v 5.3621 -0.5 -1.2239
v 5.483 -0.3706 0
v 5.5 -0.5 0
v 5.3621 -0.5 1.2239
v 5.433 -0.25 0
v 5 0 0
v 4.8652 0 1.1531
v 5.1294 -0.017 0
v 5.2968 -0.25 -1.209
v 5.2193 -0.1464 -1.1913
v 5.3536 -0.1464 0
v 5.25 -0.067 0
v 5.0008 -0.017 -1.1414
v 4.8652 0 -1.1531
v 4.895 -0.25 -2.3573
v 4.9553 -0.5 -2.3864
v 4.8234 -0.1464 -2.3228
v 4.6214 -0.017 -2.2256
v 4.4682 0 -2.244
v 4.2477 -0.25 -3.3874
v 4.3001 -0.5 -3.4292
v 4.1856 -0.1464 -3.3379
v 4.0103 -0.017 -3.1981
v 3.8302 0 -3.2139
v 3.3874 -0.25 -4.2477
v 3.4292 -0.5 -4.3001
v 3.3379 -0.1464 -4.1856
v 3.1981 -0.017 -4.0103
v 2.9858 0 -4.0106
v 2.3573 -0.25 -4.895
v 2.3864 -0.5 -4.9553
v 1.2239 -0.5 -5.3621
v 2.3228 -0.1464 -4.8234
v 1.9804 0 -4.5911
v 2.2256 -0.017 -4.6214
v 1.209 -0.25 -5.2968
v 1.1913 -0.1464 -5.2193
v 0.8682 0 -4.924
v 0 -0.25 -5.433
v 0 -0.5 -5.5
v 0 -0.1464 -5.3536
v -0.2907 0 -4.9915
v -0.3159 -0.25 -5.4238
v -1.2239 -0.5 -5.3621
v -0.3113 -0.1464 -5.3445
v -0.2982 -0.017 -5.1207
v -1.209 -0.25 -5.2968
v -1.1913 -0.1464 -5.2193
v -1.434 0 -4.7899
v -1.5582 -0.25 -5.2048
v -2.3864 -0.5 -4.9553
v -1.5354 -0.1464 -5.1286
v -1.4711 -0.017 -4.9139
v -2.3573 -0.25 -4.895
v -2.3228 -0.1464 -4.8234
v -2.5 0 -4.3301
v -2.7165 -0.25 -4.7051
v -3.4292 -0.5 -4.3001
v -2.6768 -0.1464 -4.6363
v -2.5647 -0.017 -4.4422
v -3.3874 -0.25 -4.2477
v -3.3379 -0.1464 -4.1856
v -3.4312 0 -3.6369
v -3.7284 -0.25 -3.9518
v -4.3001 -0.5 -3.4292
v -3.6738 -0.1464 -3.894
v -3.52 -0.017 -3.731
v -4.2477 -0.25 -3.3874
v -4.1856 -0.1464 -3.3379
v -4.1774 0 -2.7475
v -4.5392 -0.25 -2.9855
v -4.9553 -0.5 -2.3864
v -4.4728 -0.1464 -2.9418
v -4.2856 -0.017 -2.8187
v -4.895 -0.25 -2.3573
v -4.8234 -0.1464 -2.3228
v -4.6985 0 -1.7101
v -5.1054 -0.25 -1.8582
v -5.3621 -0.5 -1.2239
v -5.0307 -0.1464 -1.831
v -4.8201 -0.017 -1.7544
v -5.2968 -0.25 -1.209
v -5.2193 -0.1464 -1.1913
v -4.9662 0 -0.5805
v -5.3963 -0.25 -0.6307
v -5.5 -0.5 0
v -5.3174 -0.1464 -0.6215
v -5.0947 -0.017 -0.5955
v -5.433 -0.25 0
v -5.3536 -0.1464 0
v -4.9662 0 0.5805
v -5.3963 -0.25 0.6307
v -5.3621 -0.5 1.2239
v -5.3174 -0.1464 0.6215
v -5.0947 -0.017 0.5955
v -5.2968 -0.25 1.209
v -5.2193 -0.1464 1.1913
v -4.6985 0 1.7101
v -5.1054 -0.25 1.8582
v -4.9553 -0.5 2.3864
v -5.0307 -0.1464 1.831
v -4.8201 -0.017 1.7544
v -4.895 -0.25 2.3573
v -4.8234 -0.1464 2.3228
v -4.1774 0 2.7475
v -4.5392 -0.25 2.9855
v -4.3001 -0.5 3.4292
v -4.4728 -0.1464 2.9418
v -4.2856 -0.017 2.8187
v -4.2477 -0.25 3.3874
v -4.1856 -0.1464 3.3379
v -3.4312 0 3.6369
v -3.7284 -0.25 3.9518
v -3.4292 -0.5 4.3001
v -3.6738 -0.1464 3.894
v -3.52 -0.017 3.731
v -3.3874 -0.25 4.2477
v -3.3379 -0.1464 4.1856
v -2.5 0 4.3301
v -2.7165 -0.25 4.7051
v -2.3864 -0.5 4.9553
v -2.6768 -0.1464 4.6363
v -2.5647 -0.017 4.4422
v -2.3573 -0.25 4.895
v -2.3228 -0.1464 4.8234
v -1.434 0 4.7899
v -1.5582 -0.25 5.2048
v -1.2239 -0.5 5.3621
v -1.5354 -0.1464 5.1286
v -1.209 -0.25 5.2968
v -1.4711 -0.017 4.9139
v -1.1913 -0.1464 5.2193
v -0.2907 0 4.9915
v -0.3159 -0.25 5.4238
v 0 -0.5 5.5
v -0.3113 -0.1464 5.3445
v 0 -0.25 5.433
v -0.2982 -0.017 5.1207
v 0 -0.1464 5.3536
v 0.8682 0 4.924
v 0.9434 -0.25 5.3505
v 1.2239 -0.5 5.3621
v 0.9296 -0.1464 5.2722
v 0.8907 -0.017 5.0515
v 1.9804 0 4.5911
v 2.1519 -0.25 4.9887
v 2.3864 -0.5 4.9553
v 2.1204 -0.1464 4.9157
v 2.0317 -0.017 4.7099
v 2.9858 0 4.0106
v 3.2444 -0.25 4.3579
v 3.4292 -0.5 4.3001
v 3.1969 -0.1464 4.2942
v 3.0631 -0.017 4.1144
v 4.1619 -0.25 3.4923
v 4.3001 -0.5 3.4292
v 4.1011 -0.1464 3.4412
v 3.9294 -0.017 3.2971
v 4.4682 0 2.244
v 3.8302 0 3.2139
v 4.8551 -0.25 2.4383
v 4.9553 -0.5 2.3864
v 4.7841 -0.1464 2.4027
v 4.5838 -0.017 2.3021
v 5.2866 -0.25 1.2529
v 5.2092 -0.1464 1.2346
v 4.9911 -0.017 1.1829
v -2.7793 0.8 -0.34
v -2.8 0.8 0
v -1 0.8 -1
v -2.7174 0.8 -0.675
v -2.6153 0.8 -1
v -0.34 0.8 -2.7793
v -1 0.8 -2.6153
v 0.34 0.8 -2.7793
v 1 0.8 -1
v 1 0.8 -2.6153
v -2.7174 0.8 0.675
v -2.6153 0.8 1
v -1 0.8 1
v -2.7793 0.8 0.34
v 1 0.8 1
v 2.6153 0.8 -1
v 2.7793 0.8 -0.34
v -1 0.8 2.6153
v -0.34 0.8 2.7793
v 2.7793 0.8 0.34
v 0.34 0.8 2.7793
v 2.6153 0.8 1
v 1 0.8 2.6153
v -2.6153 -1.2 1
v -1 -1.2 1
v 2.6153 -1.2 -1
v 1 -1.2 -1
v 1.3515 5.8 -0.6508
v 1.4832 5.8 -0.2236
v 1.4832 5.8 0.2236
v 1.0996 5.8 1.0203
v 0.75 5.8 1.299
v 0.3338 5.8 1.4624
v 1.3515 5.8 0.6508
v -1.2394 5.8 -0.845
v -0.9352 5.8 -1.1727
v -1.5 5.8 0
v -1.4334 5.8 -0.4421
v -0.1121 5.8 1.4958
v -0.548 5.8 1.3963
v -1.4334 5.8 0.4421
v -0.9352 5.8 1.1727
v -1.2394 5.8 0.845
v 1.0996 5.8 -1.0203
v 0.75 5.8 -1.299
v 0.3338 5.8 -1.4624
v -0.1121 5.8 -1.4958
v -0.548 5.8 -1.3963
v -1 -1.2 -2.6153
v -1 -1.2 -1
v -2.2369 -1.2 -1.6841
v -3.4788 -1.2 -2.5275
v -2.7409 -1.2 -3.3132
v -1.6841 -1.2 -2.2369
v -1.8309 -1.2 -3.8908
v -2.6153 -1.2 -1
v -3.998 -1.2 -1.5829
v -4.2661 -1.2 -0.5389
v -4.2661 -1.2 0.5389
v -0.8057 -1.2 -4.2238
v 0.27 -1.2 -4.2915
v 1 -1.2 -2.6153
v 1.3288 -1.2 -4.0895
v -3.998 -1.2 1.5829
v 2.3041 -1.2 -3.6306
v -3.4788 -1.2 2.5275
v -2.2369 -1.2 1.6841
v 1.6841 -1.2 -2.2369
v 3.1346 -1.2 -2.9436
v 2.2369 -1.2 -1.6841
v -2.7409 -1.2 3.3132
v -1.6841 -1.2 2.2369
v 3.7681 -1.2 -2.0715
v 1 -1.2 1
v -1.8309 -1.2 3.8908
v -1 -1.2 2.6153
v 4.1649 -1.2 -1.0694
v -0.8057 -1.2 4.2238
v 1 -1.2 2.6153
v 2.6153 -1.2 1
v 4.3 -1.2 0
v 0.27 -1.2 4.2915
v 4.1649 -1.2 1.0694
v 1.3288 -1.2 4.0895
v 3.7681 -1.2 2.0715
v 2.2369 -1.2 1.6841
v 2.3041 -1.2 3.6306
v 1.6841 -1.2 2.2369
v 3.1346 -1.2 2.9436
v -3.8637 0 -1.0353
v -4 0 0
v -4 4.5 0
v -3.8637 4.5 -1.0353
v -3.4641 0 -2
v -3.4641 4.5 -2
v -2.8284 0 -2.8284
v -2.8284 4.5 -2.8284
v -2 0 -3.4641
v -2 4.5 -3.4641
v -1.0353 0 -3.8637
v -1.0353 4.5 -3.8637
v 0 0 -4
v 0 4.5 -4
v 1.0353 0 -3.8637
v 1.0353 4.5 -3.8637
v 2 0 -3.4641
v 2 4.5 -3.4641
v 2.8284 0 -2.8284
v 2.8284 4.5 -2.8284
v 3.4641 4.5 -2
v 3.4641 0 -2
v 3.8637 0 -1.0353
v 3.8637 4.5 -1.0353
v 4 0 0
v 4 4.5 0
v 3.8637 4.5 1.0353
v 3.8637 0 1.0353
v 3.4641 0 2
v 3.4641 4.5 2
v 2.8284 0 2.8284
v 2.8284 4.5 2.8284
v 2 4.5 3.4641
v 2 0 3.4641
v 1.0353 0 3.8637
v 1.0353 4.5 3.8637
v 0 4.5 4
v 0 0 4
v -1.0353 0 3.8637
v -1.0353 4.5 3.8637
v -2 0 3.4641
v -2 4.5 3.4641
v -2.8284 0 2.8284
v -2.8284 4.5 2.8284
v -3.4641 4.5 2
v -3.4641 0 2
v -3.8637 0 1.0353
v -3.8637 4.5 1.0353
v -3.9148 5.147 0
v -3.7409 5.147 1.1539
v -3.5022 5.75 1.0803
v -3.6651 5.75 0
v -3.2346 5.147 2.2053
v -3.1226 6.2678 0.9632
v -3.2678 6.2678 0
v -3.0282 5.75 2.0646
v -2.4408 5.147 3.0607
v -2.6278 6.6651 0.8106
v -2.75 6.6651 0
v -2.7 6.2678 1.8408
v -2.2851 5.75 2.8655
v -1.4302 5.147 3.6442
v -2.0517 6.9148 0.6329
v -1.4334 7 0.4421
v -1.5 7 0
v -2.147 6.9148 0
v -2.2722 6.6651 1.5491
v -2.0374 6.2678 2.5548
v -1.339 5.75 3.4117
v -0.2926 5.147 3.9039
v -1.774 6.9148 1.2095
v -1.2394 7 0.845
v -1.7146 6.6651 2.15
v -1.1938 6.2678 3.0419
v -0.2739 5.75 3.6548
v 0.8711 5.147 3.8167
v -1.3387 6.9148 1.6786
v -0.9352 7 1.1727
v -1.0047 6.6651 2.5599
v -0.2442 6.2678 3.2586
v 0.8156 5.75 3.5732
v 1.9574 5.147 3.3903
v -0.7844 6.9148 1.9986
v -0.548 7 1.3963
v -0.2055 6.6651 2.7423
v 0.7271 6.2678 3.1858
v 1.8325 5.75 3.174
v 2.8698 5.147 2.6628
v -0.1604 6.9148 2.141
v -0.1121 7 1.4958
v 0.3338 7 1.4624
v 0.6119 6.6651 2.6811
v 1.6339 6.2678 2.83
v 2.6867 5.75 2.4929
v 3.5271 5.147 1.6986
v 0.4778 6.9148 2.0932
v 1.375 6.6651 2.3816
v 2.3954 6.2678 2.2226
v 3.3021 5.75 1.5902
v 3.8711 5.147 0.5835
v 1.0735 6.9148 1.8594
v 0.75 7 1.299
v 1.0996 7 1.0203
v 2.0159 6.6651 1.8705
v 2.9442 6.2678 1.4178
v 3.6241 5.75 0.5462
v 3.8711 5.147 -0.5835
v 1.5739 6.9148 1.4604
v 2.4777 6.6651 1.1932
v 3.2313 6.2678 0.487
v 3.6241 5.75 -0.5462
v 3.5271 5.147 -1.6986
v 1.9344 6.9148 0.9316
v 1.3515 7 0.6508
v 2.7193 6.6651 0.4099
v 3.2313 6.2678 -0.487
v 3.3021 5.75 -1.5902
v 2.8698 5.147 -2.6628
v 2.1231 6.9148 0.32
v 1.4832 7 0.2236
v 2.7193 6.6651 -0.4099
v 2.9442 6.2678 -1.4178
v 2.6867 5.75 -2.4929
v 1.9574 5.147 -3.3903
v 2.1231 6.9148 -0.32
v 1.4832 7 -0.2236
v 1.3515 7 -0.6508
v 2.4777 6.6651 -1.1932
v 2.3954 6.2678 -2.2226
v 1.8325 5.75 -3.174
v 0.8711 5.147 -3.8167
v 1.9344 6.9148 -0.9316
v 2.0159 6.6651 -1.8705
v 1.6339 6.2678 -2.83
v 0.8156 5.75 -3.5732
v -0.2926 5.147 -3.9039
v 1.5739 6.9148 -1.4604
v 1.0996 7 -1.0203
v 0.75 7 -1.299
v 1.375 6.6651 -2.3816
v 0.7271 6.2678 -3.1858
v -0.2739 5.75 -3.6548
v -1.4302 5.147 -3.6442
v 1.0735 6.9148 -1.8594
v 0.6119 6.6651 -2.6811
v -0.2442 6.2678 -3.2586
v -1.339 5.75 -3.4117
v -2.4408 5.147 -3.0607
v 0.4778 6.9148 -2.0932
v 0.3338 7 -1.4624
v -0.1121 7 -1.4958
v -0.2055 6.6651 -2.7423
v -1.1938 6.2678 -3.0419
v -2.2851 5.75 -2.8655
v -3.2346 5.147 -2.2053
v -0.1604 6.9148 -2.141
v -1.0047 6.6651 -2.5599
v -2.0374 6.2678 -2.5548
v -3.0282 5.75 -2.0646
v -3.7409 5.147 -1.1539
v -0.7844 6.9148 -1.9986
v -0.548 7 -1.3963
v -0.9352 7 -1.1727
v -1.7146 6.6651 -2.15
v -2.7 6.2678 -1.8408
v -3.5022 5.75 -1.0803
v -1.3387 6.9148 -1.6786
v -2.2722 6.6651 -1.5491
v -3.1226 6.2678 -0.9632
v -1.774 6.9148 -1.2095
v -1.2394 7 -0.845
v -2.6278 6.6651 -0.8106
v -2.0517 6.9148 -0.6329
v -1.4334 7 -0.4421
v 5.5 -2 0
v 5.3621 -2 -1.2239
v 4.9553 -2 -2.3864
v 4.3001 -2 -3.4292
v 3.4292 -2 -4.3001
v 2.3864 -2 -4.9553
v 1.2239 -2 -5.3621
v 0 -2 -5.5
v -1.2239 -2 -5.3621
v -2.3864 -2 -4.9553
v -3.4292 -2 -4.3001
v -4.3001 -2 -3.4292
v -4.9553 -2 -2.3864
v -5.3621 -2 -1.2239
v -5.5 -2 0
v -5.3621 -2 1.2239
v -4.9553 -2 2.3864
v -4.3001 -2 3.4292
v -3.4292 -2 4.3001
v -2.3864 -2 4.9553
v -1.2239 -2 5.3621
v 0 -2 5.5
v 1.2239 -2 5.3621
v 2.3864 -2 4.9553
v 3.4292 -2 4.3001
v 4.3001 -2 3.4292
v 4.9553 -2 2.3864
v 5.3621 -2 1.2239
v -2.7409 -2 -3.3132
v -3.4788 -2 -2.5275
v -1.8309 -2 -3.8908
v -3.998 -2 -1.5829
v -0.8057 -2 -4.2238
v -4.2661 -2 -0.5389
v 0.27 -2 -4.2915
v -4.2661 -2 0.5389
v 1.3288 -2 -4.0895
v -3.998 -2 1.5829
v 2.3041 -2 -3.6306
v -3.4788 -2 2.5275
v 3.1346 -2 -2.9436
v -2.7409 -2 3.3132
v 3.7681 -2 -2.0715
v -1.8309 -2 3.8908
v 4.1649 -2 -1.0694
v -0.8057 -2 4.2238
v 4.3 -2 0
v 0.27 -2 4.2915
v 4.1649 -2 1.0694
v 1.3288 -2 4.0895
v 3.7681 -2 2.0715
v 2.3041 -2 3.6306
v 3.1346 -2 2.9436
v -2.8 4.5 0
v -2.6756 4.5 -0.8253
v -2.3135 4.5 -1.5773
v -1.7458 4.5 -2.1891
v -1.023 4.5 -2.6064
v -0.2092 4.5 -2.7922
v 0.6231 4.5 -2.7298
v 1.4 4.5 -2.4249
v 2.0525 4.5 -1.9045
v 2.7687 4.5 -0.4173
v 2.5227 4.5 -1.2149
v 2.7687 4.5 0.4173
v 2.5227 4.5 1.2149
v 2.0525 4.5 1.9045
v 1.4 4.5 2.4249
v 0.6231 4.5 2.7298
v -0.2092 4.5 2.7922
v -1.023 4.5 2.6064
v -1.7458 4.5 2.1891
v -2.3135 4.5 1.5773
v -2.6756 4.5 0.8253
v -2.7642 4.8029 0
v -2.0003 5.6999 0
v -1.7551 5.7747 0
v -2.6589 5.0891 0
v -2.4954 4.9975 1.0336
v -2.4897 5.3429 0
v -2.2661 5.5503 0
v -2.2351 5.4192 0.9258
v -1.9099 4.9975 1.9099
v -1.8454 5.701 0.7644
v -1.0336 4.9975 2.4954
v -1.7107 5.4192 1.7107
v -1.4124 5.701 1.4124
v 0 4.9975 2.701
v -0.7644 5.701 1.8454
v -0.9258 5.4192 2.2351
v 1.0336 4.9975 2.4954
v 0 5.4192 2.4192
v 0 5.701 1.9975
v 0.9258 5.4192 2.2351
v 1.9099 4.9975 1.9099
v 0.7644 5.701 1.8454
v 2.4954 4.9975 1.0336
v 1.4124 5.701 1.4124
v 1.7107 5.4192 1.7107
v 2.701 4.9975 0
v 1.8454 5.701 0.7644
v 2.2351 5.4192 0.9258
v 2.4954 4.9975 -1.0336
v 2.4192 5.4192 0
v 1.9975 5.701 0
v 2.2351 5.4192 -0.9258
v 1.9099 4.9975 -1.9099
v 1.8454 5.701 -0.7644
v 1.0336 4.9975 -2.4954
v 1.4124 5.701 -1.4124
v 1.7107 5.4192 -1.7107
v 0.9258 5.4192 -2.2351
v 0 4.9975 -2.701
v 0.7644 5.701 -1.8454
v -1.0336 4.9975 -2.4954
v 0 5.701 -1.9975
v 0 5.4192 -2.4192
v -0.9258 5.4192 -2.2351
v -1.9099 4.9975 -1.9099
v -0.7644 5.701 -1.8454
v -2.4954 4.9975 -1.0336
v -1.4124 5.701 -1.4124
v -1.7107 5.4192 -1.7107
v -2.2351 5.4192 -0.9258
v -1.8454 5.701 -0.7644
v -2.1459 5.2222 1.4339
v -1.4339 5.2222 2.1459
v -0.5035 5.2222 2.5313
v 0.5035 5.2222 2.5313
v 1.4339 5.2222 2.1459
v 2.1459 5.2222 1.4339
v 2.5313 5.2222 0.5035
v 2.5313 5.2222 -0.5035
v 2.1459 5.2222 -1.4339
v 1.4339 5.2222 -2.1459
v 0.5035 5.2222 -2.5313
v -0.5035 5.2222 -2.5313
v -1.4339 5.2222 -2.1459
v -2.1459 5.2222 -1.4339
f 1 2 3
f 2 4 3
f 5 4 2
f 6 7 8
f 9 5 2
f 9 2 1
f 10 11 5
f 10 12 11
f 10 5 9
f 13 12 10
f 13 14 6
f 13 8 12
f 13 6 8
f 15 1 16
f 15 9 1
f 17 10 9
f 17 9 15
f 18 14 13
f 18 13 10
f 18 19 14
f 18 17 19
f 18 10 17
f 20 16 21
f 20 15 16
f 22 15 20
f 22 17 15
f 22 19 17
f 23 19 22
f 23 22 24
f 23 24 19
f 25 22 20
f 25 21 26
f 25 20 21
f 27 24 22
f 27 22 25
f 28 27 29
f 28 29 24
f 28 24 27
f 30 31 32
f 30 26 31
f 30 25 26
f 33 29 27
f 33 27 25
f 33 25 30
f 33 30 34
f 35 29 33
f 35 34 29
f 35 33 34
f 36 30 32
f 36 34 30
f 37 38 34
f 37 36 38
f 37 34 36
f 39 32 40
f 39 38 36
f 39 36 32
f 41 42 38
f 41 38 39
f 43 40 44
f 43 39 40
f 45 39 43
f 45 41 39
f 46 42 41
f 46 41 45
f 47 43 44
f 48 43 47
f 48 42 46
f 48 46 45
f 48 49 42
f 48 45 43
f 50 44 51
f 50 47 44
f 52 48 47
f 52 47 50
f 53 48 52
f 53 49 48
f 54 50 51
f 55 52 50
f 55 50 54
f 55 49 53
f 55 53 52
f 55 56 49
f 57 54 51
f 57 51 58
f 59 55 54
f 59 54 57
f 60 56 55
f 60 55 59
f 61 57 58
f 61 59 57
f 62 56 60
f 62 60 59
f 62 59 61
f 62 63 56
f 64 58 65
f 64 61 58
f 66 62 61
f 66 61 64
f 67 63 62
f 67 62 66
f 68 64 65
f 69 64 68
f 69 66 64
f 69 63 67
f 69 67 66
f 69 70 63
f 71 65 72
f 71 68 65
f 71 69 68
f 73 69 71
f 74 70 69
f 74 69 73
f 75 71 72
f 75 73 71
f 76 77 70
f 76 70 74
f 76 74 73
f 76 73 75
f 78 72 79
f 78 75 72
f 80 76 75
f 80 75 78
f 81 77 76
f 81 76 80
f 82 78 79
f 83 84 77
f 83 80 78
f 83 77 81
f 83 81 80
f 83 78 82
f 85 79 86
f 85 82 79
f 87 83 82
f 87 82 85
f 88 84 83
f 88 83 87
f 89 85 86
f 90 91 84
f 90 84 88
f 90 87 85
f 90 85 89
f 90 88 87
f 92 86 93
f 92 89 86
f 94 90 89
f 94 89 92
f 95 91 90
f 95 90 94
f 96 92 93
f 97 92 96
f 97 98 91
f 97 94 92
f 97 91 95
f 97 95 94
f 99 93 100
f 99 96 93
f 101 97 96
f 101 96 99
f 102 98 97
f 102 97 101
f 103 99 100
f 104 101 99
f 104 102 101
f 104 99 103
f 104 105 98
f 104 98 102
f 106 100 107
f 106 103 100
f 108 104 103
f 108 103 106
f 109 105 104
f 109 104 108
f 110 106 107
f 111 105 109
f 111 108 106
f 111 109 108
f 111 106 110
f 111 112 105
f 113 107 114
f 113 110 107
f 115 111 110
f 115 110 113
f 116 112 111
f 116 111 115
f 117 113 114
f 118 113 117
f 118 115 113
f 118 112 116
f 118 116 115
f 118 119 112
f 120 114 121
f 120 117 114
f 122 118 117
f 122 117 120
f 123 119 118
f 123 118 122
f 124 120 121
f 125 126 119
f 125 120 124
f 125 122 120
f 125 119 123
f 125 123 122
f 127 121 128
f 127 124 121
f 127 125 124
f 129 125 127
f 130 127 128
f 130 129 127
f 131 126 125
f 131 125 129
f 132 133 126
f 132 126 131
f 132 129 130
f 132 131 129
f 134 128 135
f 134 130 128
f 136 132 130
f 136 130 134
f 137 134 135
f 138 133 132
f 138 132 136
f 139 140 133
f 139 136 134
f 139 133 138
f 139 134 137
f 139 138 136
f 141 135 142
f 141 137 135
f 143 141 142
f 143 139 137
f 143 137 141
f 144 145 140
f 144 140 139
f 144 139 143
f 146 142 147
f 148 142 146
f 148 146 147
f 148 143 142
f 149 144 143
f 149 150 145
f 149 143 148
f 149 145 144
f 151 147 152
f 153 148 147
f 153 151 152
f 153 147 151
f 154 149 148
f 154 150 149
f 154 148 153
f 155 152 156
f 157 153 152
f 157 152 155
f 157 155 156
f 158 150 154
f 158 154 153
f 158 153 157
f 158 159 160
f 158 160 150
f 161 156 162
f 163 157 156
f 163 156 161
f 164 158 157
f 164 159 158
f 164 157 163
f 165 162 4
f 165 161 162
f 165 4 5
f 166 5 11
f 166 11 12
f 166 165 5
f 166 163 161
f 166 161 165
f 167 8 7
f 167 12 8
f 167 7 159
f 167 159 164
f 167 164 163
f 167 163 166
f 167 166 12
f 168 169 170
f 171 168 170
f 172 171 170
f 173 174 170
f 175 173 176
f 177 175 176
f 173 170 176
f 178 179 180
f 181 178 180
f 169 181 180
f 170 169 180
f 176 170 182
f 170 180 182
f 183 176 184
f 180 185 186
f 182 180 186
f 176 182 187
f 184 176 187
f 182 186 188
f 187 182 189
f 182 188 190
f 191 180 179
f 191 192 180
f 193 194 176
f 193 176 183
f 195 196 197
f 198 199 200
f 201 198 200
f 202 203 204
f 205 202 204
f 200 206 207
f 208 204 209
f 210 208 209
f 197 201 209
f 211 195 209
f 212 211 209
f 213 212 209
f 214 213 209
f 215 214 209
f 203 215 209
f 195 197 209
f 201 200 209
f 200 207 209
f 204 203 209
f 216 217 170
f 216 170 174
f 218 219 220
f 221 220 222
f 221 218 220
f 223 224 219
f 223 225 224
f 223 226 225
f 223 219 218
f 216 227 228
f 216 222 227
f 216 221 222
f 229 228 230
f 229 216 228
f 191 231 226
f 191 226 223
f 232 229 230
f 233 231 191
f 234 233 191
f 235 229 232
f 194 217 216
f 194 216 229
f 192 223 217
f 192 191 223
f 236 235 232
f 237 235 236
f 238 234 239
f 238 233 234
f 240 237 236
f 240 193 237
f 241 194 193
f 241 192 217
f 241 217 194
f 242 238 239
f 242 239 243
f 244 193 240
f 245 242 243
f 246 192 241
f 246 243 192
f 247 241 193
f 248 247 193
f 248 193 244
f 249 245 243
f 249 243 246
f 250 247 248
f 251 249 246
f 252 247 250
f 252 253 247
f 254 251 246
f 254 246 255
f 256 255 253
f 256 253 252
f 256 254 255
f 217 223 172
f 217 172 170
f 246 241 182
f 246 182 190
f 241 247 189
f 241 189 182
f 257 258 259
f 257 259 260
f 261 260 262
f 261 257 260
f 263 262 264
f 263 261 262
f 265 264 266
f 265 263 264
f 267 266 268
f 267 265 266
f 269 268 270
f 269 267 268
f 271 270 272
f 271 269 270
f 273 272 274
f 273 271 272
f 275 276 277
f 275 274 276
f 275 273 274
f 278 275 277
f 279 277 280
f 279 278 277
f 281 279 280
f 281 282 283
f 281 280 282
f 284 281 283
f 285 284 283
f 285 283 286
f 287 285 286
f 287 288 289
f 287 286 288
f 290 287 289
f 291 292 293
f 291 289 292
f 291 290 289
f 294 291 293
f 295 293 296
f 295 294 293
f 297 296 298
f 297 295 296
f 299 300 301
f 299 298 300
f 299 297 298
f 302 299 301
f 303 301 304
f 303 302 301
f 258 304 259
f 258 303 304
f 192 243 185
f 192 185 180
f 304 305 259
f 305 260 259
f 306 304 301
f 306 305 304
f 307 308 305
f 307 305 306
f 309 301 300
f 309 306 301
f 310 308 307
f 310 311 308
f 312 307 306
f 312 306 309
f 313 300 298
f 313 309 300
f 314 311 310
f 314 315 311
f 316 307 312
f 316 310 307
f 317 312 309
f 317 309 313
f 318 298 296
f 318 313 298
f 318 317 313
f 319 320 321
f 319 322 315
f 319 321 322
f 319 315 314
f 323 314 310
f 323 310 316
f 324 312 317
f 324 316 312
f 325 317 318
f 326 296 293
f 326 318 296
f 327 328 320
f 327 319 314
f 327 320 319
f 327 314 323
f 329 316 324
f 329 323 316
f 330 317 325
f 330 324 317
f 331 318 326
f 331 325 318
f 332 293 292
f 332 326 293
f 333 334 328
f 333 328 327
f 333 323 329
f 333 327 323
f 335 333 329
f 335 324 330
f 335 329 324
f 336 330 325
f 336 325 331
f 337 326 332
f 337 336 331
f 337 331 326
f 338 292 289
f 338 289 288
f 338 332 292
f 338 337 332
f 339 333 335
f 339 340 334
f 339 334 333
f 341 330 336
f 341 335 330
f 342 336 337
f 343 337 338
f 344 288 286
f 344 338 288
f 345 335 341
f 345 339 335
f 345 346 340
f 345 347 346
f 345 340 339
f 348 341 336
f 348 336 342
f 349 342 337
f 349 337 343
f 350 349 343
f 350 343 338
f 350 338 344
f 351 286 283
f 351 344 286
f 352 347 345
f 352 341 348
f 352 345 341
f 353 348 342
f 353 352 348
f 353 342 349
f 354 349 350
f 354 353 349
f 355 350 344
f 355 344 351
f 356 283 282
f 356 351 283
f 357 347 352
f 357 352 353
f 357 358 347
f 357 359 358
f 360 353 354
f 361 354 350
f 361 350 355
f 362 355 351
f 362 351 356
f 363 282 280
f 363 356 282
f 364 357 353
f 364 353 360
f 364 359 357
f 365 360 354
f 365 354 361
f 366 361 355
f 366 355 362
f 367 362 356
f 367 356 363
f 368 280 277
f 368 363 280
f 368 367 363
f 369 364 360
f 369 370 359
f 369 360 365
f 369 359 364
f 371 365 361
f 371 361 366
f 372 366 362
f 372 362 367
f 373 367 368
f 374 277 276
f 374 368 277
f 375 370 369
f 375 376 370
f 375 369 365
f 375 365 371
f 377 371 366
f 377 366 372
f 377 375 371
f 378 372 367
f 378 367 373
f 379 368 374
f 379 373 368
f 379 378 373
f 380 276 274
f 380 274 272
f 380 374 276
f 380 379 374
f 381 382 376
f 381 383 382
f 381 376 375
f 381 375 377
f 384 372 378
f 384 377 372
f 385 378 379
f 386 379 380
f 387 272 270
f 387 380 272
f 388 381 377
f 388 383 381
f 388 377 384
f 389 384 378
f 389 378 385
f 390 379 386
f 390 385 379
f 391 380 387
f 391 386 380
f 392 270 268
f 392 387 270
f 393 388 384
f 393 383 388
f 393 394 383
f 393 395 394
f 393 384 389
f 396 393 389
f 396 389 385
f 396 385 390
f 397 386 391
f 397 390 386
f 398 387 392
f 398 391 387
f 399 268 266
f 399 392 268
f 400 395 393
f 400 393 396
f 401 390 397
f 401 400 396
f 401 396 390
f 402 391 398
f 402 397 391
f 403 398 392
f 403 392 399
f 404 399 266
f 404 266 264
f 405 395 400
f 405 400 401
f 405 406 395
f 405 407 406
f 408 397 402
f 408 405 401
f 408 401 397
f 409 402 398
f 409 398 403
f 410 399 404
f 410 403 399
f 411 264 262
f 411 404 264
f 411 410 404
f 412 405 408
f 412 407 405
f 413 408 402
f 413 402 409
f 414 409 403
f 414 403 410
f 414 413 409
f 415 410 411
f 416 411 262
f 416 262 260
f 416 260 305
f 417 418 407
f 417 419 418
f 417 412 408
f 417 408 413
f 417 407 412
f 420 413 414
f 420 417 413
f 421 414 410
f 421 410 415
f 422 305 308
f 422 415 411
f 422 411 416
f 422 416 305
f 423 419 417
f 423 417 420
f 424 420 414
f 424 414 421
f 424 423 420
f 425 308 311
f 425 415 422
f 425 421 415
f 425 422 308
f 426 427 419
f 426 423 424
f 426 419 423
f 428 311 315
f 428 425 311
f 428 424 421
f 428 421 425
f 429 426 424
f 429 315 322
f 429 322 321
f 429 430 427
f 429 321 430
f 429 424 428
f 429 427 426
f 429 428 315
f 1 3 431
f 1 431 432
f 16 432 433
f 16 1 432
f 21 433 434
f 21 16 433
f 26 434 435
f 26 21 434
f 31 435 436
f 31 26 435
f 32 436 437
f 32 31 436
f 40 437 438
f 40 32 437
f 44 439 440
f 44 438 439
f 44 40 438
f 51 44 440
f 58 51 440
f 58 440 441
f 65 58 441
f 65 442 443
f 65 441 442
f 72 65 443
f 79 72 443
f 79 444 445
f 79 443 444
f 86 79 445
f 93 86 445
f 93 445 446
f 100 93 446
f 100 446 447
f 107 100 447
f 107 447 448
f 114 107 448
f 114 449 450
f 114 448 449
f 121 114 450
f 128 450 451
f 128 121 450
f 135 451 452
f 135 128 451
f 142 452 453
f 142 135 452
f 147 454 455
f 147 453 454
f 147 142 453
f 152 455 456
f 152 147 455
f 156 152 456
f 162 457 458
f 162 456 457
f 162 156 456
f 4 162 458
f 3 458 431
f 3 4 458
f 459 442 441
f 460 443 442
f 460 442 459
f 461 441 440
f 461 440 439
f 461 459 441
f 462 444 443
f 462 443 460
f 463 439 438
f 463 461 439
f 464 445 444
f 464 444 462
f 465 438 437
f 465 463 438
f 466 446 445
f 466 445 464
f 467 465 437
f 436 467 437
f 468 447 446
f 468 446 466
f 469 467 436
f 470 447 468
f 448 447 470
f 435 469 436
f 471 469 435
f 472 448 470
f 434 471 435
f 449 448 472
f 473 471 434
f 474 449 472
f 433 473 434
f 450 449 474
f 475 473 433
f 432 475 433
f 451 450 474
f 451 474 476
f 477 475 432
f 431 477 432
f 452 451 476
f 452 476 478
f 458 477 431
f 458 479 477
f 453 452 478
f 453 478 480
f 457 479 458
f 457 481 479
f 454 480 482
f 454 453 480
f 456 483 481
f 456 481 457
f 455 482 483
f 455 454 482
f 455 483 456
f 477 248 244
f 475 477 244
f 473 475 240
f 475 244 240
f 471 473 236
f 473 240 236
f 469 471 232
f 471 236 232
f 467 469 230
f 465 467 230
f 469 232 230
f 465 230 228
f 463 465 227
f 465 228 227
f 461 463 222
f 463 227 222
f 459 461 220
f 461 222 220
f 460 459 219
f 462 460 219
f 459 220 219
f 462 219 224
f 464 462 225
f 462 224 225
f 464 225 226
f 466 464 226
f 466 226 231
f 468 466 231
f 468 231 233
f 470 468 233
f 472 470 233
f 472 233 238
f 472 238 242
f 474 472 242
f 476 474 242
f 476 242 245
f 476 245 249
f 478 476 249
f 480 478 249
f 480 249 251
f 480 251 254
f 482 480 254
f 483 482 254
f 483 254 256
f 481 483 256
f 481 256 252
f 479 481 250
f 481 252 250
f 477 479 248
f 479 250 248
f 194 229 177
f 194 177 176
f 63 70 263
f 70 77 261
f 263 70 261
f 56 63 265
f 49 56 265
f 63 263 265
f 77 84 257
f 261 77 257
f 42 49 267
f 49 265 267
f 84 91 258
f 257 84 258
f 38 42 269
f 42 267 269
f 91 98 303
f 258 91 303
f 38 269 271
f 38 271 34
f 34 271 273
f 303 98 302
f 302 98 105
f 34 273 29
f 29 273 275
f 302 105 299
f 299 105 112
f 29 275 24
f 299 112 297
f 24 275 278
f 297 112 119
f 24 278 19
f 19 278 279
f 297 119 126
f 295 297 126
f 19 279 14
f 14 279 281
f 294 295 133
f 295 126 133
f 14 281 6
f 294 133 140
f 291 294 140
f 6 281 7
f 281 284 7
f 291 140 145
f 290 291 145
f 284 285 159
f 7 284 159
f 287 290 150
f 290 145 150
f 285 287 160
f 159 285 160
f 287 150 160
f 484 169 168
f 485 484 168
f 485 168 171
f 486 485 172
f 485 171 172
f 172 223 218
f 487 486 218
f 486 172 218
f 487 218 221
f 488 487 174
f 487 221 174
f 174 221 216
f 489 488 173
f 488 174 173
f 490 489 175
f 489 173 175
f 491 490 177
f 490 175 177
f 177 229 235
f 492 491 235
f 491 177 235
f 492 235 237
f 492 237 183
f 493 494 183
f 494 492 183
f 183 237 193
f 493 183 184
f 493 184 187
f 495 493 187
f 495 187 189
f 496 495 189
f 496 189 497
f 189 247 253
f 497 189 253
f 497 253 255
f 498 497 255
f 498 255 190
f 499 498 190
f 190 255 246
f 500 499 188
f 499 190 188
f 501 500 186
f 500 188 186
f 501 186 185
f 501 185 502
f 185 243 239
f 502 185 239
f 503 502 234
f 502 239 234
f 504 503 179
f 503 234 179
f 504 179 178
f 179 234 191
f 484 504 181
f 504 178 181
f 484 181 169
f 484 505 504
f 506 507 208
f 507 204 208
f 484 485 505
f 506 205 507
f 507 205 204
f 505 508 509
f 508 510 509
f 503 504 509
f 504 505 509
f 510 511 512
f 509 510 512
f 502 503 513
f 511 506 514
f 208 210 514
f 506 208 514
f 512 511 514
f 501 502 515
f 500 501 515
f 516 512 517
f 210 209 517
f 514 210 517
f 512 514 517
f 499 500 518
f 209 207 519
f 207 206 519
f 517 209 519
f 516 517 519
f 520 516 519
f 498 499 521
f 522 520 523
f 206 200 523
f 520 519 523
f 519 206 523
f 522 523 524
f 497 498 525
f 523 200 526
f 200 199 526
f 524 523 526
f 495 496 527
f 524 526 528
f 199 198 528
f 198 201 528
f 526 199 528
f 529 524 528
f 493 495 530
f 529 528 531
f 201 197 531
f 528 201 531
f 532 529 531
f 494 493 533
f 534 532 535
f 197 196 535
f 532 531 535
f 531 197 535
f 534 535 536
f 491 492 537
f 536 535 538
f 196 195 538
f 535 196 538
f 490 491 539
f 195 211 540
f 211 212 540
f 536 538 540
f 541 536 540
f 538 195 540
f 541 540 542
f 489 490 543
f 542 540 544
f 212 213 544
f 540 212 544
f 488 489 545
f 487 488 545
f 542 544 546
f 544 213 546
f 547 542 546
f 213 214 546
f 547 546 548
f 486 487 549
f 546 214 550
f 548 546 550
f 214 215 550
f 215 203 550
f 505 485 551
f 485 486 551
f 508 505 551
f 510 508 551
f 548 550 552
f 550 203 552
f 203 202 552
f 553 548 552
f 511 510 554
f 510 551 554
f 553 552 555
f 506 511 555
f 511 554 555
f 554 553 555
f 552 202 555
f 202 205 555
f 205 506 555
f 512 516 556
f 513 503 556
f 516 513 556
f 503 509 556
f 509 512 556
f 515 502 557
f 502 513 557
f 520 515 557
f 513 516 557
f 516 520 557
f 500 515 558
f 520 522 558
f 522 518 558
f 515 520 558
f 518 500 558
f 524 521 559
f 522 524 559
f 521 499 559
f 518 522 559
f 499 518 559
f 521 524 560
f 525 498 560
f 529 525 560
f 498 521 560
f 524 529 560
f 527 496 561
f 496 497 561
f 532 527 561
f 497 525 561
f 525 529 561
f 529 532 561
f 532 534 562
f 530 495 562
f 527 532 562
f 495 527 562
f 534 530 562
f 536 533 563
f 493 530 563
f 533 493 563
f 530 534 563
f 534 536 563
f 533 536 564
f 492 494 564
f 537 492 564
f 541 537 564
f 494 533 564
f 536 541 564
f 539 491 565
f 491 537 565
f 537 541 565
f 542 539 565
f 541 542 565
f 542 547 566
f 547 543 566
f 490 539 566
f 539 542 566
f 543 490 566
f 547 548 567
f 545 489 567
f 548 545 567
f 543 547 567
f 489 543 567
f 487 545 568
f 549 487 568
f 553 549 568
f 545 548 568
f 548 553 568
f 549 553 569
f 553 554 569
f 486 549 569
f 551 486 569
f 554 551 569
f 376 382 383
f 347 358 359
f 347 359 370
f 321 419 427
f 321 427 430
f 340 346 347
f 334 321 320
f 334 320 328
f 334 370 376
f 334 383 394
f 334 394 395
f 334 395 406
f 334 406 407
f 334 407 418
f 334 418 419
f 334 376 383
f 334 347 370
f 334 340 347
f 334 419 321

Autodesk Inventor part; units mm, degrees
ref_plane "YZ Plane" through (0, 0, 0) normal (1, 0, 0) x (0, 1, 0)
ref_plane "XZ Plane" through (0, 0, 0) normal (0, 1, 0) x (-1, 0, 0)
ref_plane "XY Plane" through (0, 0, 0) normal (0, 0, 1) x (1, 0, 0)
sketch "Esquisse1" plane through (0, 0, 0) normal (0, 1, 0) x (-1, 0, 0)
  circle A0 centre (0, 0) radius 4
  dimension "d0" = 8
extrude "Extrusion1" add sketch "Esquisse1" along normal blind 7
fillet "Congé1" radius 2.5 1 edges at (4, 7, 0)
sketch "Esquisse2" plane through (0, 0, 0) normal (0, -1, 0) x (1, 0, 0)
  circle A0 centre (0, 0) radius 5.5
  dimension "d4" = 11
extrude "Extrusion2" add sketch "Esquisse2" along normal blind 2
sketch "Esquisse3" plane through (0, -2, 0) normal (0, -1, 0) x (1, 0, 0)
  point P0 (0, 0)
shell "Coque1" thickness 1.2 removed faces 1 at (1.6766, -2, 0.4132)
sketch "Esquisse4" plane through (0, -1.2, 0) normal (0, -1, 0) x (1, 0, 0)
  line L0 (3.5, 1) -> (-3.5, 1)
  line L1 (-3.5, 1) -> (-3.5, -1)
  line L2 (-3.5, -1) -> (3.5, -1)
  line L3 (3.5, -1) -> (3.5, 1)
  line L4 (1, 3.5) -> (-1, 3.5)
  line L5 (-1, 3.5) -> (-1, -3.5)
  line L6 (-1, -3.5) -> (1, -3.5)
  line L7 (1, -3.5) -> (1, 3.5)
  point P0 (0, 0)
  dimension "d8" = 2
  dimension "d9" = 2
  dimension "d10" = 7
  dimension "d11" = 3.5
  dimension "d12" = 7
  dimension "d13" = 3.5
  dimension "d14" = 1
  dimension "d15" = 1
extrude "Extrusion3" add sketch "Esquisse4" against normal blind 2
fillet "Congé2" radius 0.5 1 edges at (-5.5, 0, 0)
equation "\"d9\" = d8"
equation "\"d11\" = 0.5 * d10"
equation "\"d12\" = d10"
equation "\"d13\" = 0.5 * d12"
equation "\"d14\" = 0.5 * d9"
equation "\"d15\" = 0.5 * d8"
properties part number "Button" material "Plastique ABS"
